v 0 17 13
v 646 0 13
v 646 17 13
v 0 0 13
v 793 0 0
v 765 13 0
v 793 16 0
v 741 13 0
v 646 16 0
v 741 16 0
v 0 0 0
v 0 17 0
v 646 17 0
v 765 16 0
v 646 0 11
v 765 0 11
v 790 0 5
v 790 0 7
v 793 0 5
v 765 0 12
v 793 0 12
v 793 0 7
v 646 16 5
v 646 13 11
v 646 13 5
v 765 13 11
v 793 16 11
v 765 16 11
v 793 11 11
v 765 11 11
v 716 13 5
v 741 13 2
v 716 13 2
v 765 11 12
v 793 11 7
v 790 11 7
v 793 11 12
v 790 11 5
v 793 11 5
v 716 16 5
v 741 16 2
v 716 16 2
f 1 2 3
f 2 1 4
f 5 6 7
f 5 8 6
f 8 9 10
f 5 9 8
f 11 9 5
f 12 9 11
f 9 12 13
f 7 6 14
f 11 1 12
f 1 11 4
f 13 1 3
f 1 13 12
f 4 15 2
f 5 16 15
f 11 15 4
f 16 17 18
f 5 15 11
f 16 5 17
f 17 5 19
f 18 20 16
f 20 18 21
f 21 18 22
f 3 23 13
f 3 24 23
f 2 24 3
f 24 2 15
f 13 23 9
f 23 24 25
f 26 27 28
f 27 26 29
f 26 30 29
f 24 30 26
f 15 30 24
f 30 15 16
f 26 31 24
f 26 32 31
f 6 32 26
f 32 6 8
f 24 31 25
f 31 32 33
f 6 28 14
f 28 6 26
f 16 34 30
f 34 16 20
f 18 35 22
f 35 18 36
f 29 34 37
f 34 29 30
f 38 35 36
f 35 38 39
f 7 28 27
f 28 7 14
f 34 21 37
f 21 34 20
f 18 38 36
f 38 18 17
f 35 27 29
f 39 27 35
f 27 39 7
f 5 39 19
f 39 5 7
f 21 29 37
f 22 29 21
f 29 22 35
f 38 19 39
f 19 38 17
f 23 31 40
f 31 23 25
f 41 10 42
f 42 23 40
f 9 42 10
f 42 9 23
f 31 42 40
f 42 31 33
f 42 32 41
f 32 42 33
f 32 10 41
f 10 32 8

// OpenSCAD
translate([9.5, 8.5, 6.5]) color([0.5005542720722199, 0.621843985236089, 0.6619765424276485]) cube([19, 17, 13], center=true);
translate([28.5, 8.5, 6.5]) color([0.8400519693824264, 0.699601591737329, 0.07964741684534404]) cube([19, 17, 13], center=true);
translate([47.5, 8.5, 6.5]) color([0.23738047361475634, 0.8282556520451495, 0.1762738246231843]) cube([19, 17, 13], center=true);
translate([66.5, 8.5, 6.5]) color([0.9459581227747745, 0.9565644324307663, 0.8963269305888116]) cube([19, 17, 13], center=true);
translate([85.5, 8.5, 6.5]) color([0.7428117304122551, 0.8383436924491765, 0.5614087817692366]) cube([19, 17, 13], center=true);
translate([104.5, 8.5, 6.5]) color([0.7177928021437573, 0.4271772721979724, 0.8646648421725511]) cube([19, 17, 13], center=true);
translate([123.5, 8.5, 6.5]) color([0.10365846470378459, 0.6285317276232824, 0.7101075213407797]) cube([19, 17, 13], center=true);
translate([142.5, 8.5, 6.5]) color([0.6149371087697887, 0.0400488022899097, 0.34025031183581533]) cube([19, 17, 13], center=true);
translate([161.5, 8.5, 6.5]) color([0.7380159626358669, 0.3765176313166855, 0.6257641682954356]) cube([19, 17, 13], center=true);
translate([180.5, 8.5, 6.5]) color([0.8894786539399329, 0.4963449395419606, 0.3583651728386771]) cube([19, 17, 13], center=true);
translate([199.5, 8.5, 6.5]) color([0.6716454412848432, 0.45811681625355094, 0.5074379917667022]) cube([19, 17, 13], center=true);
translate([218.5, 8.5, 6.5]) color([0.16228475224599026, 0.7529781863444399, 0.3376457636791449]) cube([19, 17, 13], center=true);
translate([237.5, 8.5, 6.5]) color([0.8033239356600728, 0.9444207727357242, 0.014783921172948133]) cube([19, 17, 13], center=true);
translate([256.5, 8.5, 6.5]) color([0.5303420268039528, 0.2882277186993394, 0.4689175335863792]) cube([19, 17, 13], center=true);
translate([275.5, 8.5, 6.5]) color([0.03492832759702502, 0.5317931441254861, 0.552095437515129]) cube([19, 17, 13], center=true);
translate([294.5, 8.5, 6.5]) color([0.9340898594770107, 0.03830085289416996, 0.3950652682884612]) cube([19, 17, 13], center=true);
translate([313.5, 8.5, 6.5]) color([0.1200155720396251, 0.34658884626630715, 0.051152415727703016]) cube([19, 17, 13], center=true);
translate([332.5, 8.5, 6.5]) color([0.2730496953424699, 0.9956802504828091, 0.25391998649183944]) cube([19, 17, 13], center=true);
translate([351.5, 8.5, 6.5]) color([0.6803935586065328, 0.7027090324157298, 0.9291230685247301]) cube([19, 17, 13], center=true);
translate([370.5, 8.5, 6.5]) color([0.9949404722907454, 0.7620813713006523, 0.7625973189567923]) cube([19, 17, 13], center=true);
translate([389.5, 8.5, 6.5]) color([0.5162610213479427, 0.3860717563215982, 0.8343975914408754]) cube([19, 17, 13], center=true);
translate([408.5, 8.5, 6.5]) color([0.2506337702942619, 0.11599539642064438, 0.9817240858781537]) cube([19, 17, 13], center=true);
translate([427.5, 8.5, 6.5]) color([0.8047994372884794, 0.9431012043694105, 0.24264659424234813]) cube([19, 17, 13], center=true);
translate([442.5, 8.5, 6.5]) color([0.6738638931519124, 0.5327800265053269, 0.8756440829735669]) cube([11, 17, 13], center=true);
translate([453.5, 8.5, 6.5]) color([0.16255101499230828, 0.8680483691353614, 0.15305579700066485]) cube([11, 17, 13], center=true);
translate([464.5, 8.5, 6.5]) color([0.8462165202751376, 0.8200801239095041, 0.5849326984313064]) cube([11, 17, 13], center=true);
translate([475.5, 8.5, 6.5]) color([0.05125489506773162, 0.156166769208809, 0.34458118202681143]) cube([11, 17, 13], center=true);
translate([486.5, 8.5, 6.5]) color([0.291190613997825, 0.29342424365134856, 0.49485912757206985]) cube([11, 17, 13], center=true);
translate([497.5, 8.5, 6.5]) color([0.40365829021262367, 0.43100562682353716, 0.17003546655932655]) cube([11, 17, 13], center=true);
translate([508.5, 8.5, 6.5]) color([0.788340085303476, 0.5686027559906347, 0.44188886974638586]) cube([11, 17, 13], center=true);
translate([519.5, 8.5, 6.5]) color([0.3413461590512491, 0.009317740415098474, 0.72162474304745]) cube([11, 17, 13], center=true);
translate([530.5, 8.5, 6.5]) color([0.9099060293040379, 0.6642090292154819, 0.6628365798191557]) cube([11, 17, 13], center=true);
translate([541.5, 8.5, 6.5]) color([0.2575988974219705, 0.6122127561841502, 0.07024606726227145]) cube([11, 17, 13], center=true);
translate([552.5, 8.5, 6.5]) color([0.936077955543095, 0.27870721332570936, 0.8301443917589898]) cube([11, 17, 13], center=true);
translate([563.5, 8.5, 6.5]) color([0.5295296249528143, 0.06328696503387199, 0.639390097241117]) cube([11, 17, 13], center=true);
translate([574.5, 8.5, 6.5]) color([0.579686955437464, 0.9416538141960143, 0.6321291610349786]) cube([11, 17, 13], center=true);
translate([585.5, 8.5, 6.5]) color([0.5434228748459046, 0.38469874676133664, 0.434637548519362]) cube([11, 17, 13], center=true);
translate([596.5, 8.5, 6.5]) color([0.31139777068021024, 0.01363511702942577, 0.7785312160167684]) cube([11, 17, 13], center=true);
translate([607.5, 8.5, 6.5]) color([0.8197509625398982, 0.28044077713976767, 0.2581907625337724]) cube([11, 17, 13], center=true);
translate([618.5, 8.5, 6.5]) color([0.5272652548146236, 0.3179301097250754, 0.3422638341038545]) cube([11, 17, 13], center=true);
translate([629.5, 8.5, 6.5]) color([0.7055726929201963, 0.43169639849300545, 0.14170724037842175]) cube([11, 17, 13], center=true);
translate([640.5, 8.5, 6.5]) color([0.0059275683019511805, 0.5113413643489257, 0.7846494738841625]) cube([11, 17, 13], center=true);
translate([649.5, 6.5, 5.5]) color([0.7013909140505133, 0.7815279332048084, 0.38414456219182536]) cube([7, 13, 11], center=true);
translate([656.5, 6.5, 5.5]) color([0.4641305725985776, 0.036369164001931575, 0.9124290899309246]) cube([7, 13, 11], center=true);
translate([663.5, 6.5, 5.5]) color([0.6366653413633517, 0.798477007479407, 0.7602358551941967]) cube([7, 13, 11], center=true);
translate([670.5, 6.5, 5.5]) color([0.899814300356001, 0.3622224295816935, 0.9815510059994267]) cube([7, 13, 11], center=true);
translate([677.5, 6.5, 5.5]) color([0.15851660579635174, 0.19450942151924966, 0.35447317829590397]) cube([7, 13, 11], center=true);
translate([684.5, 6.5, 5.5]) color([0.700089123077614, 0.019141470871264166, 0.7352582011311831]) cube([7, 13, 11], center=true);
translate([691.5, 6.5, 5.5]) color([0.5715587801616956, 0.24207966979200135, 0.18514161515939986]) cube([7, 13, 11], center=true);
translate([698.5, 6.5, 5.5]) color([0.7580746928341441, 0.4199819570625165, 0.5731405723704375]) cube([7, 13, 11], center=true);
translate([705.5, 6.5, 5.5]) color([0.23673356878784502, 0.7138158488992904, 0.8637627475626694]) cube([7, 13, 11], center=true);
translate([712.5, 6.5, 5.5]) color([0.8949592620642776, 0.8103115760161889, 0.1004216369837837]) cube([7, 13, 11], center=true);
translate([719.5, 6.5, 5.5]) color([0.18827941391234093, 0.44049583318501173, 0.06522983258952386]) cube([7, 13, 11], center=true);
translate([726.5, 6.5, 5.5]) color([0.42674703623912436, 0.3947422574489625, 0.27185274848852736]) cube([7, 13, 11], center=true);
translate([733.5, 6.5, 5.5]) color([0.43721657158275895, 0.7577296702077931, 0.3561631337530091]) cube([7, 13, 11], center=true);
translate([740.5, 6.5, 5.5]) color([0.3277620307403001, 0.30701912216942273, 0.492518074892234]) cube([7, 13, 11], center=true);
translate([747.5, 6.5, 5.5]) color([0.7625268269371841, 0.2027877178963453, 0.39789846082497404]) cube([7, 13, 11], center=true);
translate([754.5, 6.5, 5.5]) color([0.4356119392473006, 0.6353731723550147, 0.673076446274384]) cube([7, 13, 11], center=true);
translate([761.5, 6.5, 5.5]) color([0.6970991483341651, 0.8225488218547198, 0.5826892216899469]) cube([7, 13, 11], center=true);
translate([767.5, 5.5, 3.5]) color([0.3545830833155835, 0.5687886411459258, 0.564415288794693]) cube([5, 11, 7], center=true);
translate([768.5, 13.5, 5.5]) color([0.2783497745403337, 0.8220051901362931, 0.39809270556066123]) cube([7, 5, 11], center=true);
translate([768.5, 5.5, 9.5]) color([0.9209203386432881, 0.13533998311747797, 0.08148203466772541]) cube([7, 11, 5], center=true);
translate([772.5, 5.5, 3.5]) color([0.8649487446802395, 0.36102136972914045, 0.06937329613248533]) cube([5, 11, 7], center=true);
translate([775.5, 13.5, 5.5]) color([0.7172877126247486, 0.671396341477498, 0.47110224547326685]) cube([7, 5, 11], center=true);
translate([775.5, 5.5, 9.5]) color([0.3145322421799046, 0.8413649413366762, 0.9545082818366412]) cube([7, 11, 5], center=true);
translate([777.5, 5.5, 3.5]) color([0.02538948740661906, 0.39264862168779513, 0.12527064222330164]) cube([5, 11, 7], center=true);
translate([782.5, 5.5, 3.5]) color([0.9928151500577586, 0.6355716010561779, 0.40641678624517696]) cube([5, 11, 7], center=true);
translate([782.5, 13.5, 5.5]) color([0.1421319514189895, 0.14748951348813844, 0.8666090764559645]) cube([7, 5, 11], center=true);
translate([782.5, 5.5, 9.5]) color([0.5114920143771782, 0.16291179601388028, 0.8928293074217152]) cube([7, 11, 5], center=true);
translate([787.5, 5.5, 3.5]) color([0.9106207302279238, 0.7053130391381187, 0.7162737307255599]) cube([5, 11, 7], center=true);
translate([789.5, 13.5, 5.5]) color([0.7235742512845528, 0.7298089625221481, 0.5196081403156461]) cube([7, 5, 11], center=true);
translate([789.5, 5.5, 9.5]) color([0.823493134639761, 0.6911885197769689, 0.6973164426626367]) cube([7, 11, 5], center=true);
translate([791.5, 3.5, 2.5]) color([0.38726457915960755, 0.18022138882203653, 0.8001465394041192]) cube([3, 7, 5], center=true);
translate([649.5, 14.5, 2.5]) color([0.8129994204848935, 0.08072942167368968, 0.17442535469903642]) cube([7, 3, 5], center=true);
translate([656.5, 14.5, 2.5]) color([0.26558344961408153, 0.8002006207478382, 0.3279381595582189]) cube([7, 3, 5], center=true);
translate([663.5, 14.5, 2.5]) color([0.7086727191051987, 0.7823295314553788, 0.5174360046946651]) cube([7, 3, 5], center=true);
translate([670.5, 14.5, 2.5]) color([0.45647885649310815, 0.9099967640280606, 0.7566722996545016]) cube([7, 3, 5], center=true);
translate([677.5, 14.5, 2.5]) color([0.44882496858184395, 0.15281911968142636, 0.6325441046469116]) cube([7, 3, 5], center=true);
translate([684.5, 14.5, 2.5]) color([0.1769660088535372, 0.5122224095001495, 0.8959696721858674]) cube([7, 3, 5], center=true);
translate([691.5, 14.5, 2.5]) color([0.31608020378500323, 0.9467436825606468, 0.1928870204716916]) cube([7, 3, 5], center=true);
translate([698.5, 14.5, 2.5]) color([0.7910187054913302, 0.6108926701450443, 0.8122678209742187]) cube([7, 3, 5], center=true);
translate([705.5, 14.5, 2.5]) color([0.5222627979471512, 0.7095307583634994, 0.9126687247694082]) cube([7, 3, 5], center=true);
translate([712.5, 14.5, 2.5]) color([0.13487625477079712, 0.7715208720856912, 0.05716454642595936]) cube([7, 3, 5], center=true);
translate([791.5, 8.0, 2.5]) color([0.08241654053773162, 0.5176706786705761, 0.0024604932439482585]) cube([3, 2, 5], center=true);
translate([791.5, 10.0, 2.5]) color([0.774865046739482, 0.10398133417765076, 0.6075408633971222]) cube([3, 2, 5], center=true);
translate([718.5, 14.5, 1.0]) color([0.5702741924791085, 0.335807396721168, 0.3780654483467295]) cube([5, 3, 2], center=true);
translate([723.5, 14.5, 1.0]) color([0.36205489178930694, 0.8413126085807436, 0.6365683683667089]) cube([5, 3, 2], center=true);
translate([728.5, 14.5, 1.0]) color([0.13610848275491239, 0.9255182446742467, 0.18259927432055334]) cube([5, 3, 2], center=true);
translate([733.5, 14.5, 1.0]) color([0.12509989752770068, 0.33788945440902196, 0.607477949510089]) cube([5, 3, 2], center=true);
translate([738.5, 14.5, 1.0]) color([0.04413950751599882, 0.6453929548117466, 0.6988419541065013]) cube([5, 3, 2], center=true);
